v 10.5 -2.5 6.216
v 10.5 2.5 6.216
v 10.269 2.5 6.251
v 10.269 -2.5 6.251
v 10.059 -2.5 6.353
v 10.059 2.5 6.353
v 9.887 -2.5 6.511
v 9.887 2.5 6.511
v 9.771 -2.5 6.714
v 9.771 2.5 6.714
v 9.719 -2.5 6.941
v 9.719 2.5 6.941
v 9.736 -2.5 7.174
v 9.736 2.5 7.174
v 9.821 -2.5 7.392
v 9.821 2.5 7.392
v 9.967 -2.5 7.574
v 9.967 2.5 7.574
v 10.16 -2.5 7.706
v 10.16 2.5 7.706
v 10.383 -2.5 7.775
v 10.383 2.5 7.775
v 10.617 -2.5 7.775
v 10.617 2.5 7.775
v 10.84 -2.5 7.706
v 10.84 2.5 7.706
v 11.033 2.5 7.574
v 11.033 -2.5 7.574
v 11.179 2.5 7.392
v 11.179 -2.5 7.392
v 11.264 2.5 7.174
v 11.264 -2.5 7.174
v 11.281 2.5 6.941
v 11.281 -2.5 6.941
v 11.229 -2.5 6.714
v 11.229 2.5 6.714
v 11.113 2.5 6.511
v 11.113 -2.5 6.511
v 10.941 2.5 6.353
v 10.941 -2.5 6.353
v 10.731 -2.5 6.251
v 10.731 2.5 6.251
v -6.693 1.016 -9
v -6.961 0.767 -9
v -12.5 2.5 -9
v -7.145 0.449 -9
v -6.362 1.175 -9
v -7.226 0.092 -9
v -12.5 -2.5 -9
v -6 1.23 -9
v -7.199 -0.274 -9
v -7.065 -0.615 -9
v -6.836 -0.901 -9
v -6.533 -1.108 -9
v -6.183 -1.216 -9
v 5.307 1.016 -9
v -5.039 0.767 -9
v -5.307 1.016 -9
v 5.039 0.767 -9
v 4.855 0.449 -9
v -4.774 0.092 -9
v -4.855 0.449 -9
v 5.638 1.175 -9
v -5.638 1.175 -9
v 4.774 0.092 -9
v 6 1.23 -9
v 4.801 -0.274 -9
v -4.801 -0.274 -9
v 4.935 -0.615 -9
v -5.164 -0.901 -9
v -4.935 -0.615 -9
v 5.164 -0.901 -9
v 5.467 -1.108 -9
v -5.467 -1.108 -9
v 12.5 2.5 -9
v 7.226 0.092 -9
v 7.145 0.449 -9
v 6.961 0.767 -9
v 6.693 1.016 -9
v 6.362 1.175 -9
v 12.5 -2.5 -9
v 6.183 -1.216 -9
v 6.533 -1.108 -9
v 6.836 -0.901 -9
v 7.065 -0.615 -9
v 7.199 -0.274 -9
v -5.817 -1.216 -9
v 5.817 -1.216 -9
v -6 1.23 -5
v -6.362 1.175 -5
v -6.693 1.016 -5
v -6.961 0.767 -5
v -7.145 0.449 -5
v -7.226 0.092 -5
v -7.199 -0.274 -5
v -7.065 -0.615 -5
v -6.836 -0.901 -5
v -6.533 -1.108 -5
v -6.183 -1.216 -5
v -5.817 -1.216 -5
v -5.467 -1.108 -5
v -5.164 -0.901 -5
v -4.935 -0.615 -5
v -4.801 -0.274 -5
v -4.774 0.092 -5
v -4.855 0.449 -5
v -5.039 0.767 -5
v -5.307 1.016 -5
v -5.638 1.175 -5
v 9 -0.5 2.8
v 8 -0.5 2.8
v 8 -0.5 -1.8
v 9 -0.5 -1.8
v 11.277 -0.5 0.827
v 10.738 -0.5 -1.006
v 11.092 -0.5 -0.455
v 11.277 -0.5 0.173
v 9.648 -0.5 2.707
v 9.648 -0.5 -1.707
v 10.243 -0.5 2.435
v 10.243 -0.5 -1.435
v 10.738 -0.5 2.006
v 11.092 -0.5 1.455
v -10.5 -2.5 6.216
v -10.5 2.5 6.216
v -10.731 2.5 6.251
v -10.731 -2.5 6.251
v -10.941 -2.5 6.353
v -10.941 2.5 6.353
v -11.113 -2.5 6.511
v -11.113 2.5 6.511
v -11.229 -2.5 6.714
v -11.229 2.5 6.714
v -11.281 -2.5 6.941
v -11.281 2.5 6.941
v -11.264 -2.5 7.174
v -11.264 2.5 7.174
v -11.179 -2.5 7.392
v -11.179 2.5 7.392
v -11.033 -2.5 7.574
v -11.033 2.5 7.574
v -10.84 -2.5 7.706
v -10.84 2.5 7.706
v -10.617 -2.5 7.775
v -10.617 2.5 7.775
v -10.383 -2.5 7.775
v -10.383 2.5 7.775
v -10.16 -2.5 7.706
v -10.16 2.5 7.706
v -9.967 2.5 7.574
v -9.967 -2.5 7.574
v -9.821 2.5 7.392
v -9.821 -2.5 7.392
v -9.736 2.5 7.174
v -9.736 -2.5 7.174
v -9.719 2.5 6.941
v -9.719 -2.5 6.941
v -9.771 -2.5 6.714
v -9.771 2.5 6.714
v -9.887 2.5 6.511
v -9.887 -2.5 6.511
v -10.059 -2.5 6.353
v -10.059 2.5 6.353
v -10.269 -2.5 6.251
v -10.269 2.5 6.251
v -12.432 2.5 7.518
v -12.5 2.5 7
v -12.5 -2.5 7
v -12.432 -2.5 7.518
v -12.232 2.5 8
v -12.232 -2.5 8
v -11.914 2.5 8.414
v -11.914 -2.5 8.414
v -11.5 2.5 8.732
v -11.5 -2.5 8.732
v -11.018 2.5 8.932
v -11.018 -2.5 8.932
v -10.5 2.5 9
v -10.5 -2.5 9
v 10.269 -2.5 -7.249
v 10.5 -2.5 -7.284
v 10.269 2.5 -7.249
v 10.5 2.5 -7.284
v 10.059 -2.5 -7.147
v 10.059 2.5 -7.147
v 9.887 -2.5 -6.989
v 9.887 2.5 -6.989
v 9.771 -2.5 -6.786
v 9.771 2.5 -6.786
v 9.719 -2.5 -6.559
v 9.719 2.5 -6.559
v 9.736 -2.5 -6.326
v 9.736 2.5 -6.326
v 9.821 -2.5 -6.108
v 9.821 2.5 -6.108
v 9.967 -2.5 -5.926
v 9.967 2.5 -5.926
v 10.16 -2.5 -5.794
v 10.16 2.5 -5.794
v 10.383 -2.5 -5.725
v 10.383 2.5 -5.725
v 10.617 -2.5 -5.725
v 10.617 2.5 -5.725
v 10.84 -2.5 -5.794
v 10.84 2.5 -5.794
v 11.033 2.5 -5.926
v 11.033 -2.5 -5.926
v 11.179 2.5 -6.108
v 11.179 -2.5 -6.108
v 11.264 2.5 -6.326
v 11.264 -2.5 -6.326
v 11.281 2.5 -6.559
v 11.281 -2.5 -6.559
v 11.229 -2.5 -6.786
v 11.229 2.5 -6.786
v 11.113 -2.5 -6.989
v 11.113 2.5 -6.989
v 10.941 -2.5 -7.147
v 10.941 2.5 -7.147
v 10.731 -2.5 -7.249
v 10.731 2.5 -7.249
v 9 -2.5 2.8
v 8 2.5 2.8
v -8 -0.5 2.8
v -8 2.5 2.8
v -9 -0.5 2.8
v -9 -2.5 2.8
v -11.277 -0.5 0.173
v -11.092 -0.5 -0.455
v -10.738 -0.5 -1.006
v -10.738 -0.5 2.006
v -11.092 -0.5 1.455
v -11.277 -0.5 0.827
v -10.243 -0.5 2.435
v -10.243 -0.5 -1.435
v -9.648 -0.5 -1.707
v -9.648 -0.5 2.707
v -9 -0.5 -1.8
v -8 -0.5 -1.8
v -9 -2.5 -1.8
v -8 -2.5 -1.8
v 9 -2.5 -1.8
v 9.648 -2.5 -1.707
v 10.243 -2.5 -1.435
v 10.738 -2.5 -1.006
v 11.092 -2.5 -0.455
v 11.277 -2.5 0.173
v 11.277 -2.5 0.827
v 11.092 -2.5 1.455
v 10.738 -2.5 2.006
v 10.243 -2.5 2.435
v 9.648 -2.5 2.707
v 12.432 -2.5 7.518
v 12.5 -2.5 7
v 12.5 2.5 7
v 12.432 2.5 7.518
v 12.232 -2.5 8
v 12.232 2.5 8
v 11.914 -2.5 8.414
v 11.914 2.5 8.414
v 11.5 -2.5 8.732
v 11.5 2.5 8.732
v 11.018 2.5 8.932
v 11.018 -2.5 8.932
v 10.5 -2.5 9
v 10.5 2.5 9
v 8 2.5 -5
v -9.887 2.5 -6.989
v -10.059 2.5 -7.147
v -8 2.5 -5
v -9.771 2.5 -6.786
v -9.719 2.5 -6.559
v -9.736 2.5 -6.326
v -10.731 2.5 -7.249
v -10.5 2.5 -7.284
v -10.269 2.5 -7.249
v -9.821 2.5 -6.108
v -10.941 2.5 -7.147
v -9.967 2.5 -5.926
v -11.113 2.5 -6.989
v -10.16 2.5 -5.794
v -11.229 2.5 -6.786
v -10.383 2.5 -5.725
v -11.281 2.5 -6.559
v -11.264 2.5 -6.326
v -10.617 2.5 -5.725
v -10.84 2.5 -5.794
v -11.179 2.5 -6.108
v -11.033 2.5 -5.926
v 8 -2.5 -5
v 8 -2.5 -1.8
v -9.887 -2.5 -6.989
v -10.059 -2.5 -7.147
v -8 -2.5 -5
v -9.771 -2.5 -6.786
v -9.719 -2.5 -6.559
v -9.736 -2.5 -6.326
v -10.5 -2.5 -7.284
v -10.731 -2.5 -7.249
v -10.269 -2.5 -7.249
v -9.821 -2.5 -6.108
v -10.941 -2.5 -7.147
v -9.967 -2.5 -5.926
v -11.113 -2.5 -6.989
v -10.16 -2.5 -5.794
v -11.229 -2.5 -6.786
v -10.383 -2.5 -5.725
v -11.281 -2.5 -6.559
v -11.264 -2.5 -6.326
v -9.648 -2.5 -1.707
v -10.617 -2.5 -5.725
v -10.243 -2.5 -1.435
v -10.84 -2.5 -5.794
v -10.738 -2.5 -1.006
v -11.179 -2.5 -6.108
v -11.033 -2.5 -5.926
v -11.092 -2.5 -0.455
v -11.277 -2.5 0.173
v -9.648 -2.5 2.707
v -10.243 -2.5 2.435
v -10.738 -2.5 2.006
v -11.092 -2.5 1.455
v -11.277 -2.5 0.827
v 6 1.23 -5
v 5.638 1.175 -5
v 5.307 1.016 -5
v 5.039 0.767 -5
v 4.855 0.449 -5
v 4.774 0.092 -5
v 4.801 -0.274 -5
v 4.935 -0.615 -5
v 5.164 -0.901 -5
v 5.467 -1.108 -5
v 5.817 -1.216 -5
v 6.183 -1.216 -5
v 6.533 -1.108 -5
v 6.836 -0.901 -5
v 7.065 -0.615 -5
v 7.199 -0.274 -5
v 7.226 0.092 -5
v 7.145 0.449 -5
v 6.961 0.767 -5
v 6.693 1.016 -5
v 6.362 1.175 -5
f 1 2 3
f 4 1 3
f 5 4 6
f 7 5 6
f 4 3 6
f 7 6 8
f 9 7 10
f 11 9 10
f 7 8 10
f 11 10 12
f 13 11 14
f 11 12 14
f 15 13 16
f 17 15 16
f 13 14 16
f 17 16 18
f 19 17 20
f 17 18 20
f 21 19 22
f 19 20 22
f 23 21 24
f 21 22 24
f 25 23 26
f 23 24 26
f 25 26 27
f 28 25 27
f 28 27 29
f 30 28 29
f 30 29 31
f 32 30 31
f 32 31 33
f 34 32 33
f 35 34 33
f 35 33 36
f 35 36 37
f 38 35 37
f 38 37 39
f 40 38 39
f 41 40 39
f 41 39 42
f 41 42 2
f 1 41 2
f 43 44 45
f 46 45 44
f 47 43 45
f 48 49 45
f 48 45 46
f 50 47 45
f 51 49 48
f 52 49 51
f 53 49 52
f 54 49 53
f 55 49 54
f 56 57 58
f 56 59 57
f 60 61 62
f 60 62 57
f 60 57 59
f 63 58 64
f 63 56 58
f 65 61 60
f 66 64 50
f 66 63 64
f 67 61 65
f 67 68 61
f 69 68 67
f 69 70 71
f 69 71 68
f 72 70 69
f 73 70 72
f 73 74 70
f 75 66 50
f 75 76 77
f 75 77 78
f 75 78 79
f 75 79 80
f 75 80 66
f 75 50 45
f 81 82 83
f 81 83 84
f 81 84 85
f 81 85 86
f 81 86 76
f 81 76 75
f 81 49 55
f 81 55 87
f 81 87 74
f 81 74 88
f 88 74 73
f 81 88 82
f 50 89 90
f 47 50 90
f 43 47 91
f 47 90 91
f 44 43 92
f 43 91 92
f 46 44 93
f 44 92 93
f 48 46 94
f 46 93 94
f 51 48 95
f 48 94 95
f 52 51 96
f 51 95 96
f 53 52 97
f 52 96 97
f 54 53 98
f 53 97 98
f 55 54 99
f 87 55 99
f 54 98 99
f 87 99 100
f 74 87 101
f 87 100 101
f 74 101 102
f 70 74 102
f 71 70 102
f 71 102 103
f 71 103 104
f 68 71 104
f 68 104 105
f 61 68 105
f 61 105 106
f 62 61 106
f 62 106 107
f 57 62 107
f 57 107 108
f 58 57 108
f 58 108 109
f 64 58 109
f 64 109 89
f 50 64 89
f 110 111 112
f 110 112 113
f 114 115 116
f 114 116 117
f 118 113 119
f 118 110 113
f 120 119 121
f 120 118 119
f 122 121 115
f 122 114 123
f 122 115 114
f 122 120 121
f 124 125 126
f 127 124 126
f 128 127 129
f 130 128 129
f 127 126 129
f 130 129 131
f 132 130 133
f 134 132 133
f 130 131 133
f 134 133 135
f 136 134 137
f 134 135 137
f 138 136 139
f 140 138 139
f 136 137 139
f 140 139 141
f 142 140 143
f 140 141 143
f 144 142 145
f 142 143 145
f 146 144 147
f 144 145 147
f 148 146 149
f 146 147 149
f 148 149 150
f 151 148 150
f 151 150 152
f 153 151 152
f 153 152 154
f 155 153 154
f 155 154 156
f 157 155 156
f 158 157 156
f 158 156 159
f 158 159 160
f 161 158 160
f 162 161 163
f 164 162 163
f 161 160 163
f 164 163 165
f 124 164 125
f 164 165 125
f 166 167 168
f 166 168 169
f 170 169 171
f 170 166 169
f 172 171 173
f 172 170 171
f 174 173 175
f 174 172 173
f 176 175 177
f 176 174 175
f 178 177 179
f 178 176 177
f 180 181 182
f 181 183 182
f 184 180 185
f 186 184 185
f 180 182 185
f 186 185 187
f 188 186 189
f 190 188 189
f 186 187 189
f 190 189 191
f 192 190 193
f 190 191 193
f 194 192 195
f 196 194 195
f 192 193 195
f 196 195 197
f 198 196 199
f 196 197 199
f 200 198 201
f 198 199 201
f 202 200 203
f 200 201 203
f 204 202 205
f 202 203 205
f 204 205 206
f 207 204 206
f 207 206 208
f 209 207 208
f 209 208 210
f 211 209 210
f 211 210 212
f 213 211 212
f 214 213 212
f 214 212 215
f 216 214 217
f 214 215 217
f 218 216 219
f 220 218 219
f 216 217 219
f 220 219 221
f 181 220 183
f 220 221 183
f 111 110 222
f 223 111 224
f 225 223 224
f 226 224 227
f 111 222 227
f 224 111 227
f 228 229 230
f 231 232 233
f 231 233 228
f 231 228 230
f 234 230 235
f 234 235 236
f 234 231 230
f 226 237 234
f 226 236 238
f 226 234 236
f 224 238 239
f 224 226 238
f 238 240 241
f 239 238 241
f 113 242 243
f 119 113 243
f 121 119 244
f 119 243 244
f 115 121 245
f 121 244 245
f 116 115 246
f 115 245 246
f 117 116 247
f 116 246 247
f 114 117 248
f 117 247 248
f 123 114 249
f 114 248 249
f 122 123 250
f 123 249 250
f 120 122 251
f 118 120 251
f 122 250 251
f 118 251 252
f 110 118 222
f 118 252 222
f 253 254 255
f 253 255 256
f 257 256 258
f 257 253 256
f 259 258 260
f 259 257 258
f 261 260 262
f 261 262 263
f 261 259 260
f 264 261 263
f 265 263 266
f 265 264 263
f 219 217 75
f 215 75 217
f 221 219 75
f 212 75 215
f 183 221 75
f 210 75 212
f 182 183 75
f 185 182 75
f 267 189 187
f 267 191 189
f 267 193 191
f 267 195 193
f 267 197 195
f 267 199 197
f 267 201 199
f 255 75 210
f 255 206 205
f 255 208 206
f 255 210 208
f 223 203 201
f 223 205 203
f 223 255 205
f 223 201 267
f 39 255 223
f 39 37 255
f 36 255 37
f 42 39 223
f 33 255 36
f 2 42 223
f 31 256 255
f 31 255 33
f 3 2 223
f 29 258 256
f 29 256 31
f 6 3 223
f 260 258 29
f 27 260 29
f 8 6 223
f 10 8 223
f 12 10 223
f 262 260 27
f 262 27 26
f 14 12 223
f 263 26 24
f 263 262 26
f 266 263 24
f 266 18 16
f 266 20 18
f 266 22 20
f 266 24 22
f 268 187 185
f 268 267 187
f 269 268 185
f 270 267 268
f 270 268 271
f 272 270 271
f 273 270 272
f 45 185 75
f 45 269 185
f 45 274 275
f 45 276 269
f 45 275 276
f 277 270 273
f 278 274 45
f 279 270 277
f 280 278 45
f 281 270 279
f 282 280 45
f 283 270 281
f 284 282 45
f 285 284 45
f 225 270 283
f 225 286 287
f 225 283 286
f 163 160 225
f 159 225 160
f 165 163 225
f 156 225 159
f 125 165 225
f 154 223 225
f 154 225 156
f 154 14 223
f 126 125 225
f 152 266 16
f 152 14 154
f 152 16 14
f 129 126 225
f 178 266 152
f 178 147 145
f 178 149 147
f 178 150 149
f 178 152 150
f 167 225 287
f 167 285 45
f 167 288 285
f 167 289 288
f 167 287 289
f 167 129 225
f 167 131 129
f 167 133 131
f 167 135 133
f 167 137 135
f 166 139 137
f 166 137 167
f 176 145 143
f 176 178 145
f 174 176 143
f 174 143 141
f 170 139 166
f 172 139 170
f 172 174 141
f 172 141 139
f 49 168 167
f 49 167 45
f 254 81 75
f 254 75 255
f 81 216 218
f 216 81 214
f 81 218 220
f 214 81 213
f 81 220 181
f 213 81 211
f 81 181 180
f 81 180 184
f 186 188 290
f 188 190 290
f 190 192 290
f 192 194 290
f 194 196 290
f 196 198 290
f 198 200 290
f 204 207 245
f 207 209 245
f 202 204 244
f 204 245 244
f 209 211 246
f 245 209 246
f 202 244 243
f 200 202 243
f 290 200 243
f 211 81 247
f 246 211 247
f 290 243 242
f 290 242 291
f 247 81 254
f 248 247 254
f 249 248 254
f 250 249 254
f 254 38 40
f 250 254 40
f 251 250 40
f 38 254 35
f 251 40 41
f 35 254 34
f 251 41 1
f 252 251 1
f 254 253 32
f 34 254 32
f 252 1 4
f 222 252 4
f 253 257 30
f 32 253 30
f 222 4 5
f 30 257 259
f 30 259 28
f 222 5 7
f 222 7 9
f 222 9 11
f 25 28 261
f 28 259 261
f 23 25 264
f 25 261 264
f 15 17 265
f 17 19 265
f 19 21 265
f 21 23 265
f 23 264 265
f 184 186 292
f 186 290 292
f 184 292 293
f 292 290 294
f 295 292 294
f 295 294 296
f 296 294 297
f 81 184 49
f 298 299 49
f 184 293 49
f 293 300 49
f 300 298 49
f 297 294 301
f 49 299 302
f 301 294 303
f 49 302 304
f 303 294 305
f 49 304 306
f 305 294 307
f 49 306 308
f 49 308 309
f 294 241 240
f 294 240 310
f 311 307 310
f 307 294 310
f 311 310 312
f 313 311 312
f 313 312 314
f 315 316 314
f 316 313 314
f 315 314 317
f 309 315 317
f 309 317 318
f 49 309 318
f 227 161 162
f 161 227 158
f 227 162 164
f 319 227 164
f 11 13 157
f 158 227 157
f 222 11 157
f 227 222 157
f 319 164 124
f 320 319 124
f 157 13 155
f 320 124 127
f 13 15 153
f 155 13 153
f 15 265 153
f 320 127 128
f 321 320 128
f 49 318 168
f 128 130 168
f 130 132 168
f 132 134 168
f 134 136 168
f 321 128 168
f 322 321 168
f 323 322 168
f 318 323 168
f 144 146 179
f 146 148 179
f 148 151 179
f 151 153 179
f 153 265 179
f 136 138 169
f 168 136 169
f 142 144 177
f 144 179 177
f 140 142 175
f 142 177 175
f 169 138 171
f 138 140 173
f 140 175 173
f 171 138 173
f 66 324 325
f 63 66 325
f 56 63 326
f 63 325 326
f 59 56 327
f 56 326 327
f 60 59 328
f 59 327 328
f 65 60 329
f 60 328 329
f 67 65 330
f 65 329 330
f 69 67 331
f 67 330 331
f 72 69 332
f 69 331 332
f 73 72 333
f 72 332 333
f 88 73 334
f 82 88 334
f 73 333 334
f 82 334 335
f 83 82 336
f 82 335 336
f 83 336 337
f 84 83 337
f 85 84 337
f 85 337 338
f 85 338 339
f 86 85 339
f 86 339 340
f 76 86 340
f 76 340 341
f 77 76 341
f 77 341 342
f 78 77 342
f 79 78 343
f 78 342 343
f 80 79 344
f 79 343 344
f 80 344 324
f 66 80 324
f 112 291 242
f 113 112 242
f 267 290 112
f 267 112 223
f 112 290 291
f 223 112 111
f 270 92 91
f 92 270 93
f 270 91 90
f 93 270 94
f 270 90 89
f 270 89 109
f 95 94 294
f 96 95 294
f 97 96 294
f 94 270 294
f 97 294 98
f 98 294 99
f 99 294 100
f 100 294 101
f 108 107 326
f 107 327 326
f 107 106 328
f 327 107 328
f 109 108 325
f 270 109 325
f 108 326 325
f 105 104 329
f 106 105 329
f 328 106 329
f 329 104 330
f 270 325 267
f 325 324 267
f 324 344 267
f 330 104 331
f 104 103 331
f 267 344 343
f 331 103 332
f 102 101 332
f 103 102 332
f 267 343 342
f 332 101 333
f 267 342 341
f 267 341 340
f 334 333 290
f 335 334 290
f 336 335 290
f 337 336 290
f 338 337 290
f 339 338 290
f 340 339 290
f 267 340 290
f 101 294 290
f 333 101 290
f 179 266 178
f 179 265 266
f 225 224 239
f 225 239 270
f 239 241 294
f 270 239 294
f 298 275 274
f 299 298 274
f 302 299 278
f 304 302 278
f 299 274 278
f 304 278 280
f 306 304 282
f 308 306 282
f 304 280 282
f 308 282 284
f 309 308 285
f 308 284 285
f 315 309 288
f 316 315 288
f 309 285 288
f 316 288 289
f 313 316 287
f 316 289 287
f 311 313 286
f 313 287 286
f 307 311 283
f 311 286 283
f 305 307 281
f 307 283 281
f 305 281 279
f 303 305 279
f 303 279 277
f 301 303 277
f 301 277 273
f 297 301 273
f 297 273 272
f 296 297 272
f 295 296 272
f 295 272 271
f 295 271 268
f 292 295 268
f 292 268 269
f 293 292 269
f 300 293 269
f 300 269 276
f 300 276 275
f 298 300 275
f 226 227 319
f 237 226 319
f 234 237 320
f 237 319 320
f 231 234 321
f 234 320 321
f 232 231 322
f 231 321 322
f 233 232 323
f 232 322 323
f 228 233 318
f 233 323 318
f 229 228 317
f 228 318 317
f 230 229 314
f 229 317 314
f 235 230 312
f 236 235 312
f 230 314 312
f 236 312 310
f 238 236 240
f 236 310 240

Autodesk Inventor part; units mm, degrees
ref_plane "YZ Plane" through (0, 0, 0) normal (1, 0, 0) x (0, 1, 0)
ref_plane "XZ Plane" through (0, 0, 0) normal (0, 1, 0) x (-1, 0, 0)
ref_plane "XY Plane" through (0, 0, 0) normal (0, 0, 1) x (1, 0, 0)
sketch "Skizze1" plane through (0, 0, 0) normal (0, 1, 0) x (-1, 0, 0)
  line L0 (12.5, -9) -> (-12.5, -9)
  line L1 (-12.5, -9) -> (-12.5, 9)
  line L2 (-12.5, 9) -> (12.5, 9)
  line L3 (12.5, 9) -> (12.5, -9)
  line L4 (12.5, -9) -> (-12.5, 9) construction
  line L5 (-12.5, -9) -> (12.5, 9) construction
  line L6 (8, -5) -> (-8, -5)
  line L7 (-8, -5) -> (-8, 2.8)
  line L8 (-8, 2.8) -> (8, 2.8)
  line L9 (8, 2.8) -> (8, -5)
  line L10 (0, 2.8) -> (0, -5) construction
  point P0 (0, 0)
  point P1 (0, 0)
  dimension "d0" = 25
  dimension "d1" = 18
  dimension "d23" = 16
  dimension "d28" = 4
  dimension "d29" = 7.8
extrude "Extrusion1" add sketch "Skizze1" along normal mid plane 5
sketch "Skizze2" plane through (0, -2.5, 0) normal (0, -1, 0) x (1, 0, 0)
  line L0 (-10.5, 7) -> (10.5, 7) construction
  line L1 (10.5, 7) -> (10.5, -6.5) construction
  line L2 (10.5, -6.5) -> (-10.5, -6.5) construction
  line L3 (-10.5, -6.5) -> (-10.5, 7) construction
  line L4 (0, 12.6) -> (0, -12.6) projected
  line L5 (12.5, 9) -> (-12.5, 9) projected
  point P0 (0, 0)
  dimension "d4" = 21
  dimension "d5" = 13.5
  dimension "d6" = 2
hole "Bohrung1" at (-10.5, -2.5, 7) at (10.5, -2.5, 7) at (10.5, -2.5, -6.5) at (-10.5, -2.5, -6.5) direction (0, 1, 0) diameter 1.567 end through all thread size "M2x0.4" class "6H" standard "ISO Metric profile"
sketch "Skizze3" plane through (12.5, 2.5, -9) normal (0, 0, -1) x (-1, 0, 0)
  line L0 (25, -5) -> (25, 0) projected
  line L1 (0, 0) -> (25, 0) projected
  line L2 (0, 0) -> (0, -5) projected
  line L3 (25, -5) -> (0, -5) projected
  line L4 (25, -2.5) -> (0, -2.5) construction
  line L5 (0, -5) -> (25, -5) construction
  line L6 (12.5, -5) -> (12.5, 0) construction
  line L7 (25, 0) -> (0, 0) construction
  point P0 (12.5, -2.5)
  point P1 (18.5, -2.5)
  point P2 (6.5, -2.5)
  dimension "d14" = 12
hole "Bohrung2" at (-6, 0, -9) at (6, 0, -9) direction (0, 0, 1) diameter 2.459 depth 4 thread size "M3x0.5" class "6H" standard "ISO Metric profile"
fillet "Rundung1" radius 2 2 edges at (-12.5, 0, 9) (12.5, 0, 9)
sketch "Skizze4" plane through (0, -2.5, 0) normal (0, -1, 0) x (1, 0, 0)
  line L0 (-9, 0.5) -> (9, 0.5) construction
  line L1 (-9, -1.8) -> (9, -1.8)
  line L2 (9, 2.8) -> (-9, 2.8)
  arc A0 (-9, 2.8) -> (-9, -1.8) centre (-9, 0.5) ccw
  arc A1 (9, -1.8) -> (9, 2.8) centre (9, 0.5) ccw
  line L3 (0, 12.6) -> (0, -12.6) projected
  line L4 (-12.5, -9) -> (12.5, -9) projected
  point P0 (0, 0)
  point P1 (0, 0.5)
  dimension "d24" = 4.6
  dimension "d25" = 18
  dimension "d30" = 9.5
extrude "Extrusion2" cut sketch "Skizze4" against normal blind 2
properties part number "Kamerahalter Vorne" material "PC/ABS-Kunststoff"
